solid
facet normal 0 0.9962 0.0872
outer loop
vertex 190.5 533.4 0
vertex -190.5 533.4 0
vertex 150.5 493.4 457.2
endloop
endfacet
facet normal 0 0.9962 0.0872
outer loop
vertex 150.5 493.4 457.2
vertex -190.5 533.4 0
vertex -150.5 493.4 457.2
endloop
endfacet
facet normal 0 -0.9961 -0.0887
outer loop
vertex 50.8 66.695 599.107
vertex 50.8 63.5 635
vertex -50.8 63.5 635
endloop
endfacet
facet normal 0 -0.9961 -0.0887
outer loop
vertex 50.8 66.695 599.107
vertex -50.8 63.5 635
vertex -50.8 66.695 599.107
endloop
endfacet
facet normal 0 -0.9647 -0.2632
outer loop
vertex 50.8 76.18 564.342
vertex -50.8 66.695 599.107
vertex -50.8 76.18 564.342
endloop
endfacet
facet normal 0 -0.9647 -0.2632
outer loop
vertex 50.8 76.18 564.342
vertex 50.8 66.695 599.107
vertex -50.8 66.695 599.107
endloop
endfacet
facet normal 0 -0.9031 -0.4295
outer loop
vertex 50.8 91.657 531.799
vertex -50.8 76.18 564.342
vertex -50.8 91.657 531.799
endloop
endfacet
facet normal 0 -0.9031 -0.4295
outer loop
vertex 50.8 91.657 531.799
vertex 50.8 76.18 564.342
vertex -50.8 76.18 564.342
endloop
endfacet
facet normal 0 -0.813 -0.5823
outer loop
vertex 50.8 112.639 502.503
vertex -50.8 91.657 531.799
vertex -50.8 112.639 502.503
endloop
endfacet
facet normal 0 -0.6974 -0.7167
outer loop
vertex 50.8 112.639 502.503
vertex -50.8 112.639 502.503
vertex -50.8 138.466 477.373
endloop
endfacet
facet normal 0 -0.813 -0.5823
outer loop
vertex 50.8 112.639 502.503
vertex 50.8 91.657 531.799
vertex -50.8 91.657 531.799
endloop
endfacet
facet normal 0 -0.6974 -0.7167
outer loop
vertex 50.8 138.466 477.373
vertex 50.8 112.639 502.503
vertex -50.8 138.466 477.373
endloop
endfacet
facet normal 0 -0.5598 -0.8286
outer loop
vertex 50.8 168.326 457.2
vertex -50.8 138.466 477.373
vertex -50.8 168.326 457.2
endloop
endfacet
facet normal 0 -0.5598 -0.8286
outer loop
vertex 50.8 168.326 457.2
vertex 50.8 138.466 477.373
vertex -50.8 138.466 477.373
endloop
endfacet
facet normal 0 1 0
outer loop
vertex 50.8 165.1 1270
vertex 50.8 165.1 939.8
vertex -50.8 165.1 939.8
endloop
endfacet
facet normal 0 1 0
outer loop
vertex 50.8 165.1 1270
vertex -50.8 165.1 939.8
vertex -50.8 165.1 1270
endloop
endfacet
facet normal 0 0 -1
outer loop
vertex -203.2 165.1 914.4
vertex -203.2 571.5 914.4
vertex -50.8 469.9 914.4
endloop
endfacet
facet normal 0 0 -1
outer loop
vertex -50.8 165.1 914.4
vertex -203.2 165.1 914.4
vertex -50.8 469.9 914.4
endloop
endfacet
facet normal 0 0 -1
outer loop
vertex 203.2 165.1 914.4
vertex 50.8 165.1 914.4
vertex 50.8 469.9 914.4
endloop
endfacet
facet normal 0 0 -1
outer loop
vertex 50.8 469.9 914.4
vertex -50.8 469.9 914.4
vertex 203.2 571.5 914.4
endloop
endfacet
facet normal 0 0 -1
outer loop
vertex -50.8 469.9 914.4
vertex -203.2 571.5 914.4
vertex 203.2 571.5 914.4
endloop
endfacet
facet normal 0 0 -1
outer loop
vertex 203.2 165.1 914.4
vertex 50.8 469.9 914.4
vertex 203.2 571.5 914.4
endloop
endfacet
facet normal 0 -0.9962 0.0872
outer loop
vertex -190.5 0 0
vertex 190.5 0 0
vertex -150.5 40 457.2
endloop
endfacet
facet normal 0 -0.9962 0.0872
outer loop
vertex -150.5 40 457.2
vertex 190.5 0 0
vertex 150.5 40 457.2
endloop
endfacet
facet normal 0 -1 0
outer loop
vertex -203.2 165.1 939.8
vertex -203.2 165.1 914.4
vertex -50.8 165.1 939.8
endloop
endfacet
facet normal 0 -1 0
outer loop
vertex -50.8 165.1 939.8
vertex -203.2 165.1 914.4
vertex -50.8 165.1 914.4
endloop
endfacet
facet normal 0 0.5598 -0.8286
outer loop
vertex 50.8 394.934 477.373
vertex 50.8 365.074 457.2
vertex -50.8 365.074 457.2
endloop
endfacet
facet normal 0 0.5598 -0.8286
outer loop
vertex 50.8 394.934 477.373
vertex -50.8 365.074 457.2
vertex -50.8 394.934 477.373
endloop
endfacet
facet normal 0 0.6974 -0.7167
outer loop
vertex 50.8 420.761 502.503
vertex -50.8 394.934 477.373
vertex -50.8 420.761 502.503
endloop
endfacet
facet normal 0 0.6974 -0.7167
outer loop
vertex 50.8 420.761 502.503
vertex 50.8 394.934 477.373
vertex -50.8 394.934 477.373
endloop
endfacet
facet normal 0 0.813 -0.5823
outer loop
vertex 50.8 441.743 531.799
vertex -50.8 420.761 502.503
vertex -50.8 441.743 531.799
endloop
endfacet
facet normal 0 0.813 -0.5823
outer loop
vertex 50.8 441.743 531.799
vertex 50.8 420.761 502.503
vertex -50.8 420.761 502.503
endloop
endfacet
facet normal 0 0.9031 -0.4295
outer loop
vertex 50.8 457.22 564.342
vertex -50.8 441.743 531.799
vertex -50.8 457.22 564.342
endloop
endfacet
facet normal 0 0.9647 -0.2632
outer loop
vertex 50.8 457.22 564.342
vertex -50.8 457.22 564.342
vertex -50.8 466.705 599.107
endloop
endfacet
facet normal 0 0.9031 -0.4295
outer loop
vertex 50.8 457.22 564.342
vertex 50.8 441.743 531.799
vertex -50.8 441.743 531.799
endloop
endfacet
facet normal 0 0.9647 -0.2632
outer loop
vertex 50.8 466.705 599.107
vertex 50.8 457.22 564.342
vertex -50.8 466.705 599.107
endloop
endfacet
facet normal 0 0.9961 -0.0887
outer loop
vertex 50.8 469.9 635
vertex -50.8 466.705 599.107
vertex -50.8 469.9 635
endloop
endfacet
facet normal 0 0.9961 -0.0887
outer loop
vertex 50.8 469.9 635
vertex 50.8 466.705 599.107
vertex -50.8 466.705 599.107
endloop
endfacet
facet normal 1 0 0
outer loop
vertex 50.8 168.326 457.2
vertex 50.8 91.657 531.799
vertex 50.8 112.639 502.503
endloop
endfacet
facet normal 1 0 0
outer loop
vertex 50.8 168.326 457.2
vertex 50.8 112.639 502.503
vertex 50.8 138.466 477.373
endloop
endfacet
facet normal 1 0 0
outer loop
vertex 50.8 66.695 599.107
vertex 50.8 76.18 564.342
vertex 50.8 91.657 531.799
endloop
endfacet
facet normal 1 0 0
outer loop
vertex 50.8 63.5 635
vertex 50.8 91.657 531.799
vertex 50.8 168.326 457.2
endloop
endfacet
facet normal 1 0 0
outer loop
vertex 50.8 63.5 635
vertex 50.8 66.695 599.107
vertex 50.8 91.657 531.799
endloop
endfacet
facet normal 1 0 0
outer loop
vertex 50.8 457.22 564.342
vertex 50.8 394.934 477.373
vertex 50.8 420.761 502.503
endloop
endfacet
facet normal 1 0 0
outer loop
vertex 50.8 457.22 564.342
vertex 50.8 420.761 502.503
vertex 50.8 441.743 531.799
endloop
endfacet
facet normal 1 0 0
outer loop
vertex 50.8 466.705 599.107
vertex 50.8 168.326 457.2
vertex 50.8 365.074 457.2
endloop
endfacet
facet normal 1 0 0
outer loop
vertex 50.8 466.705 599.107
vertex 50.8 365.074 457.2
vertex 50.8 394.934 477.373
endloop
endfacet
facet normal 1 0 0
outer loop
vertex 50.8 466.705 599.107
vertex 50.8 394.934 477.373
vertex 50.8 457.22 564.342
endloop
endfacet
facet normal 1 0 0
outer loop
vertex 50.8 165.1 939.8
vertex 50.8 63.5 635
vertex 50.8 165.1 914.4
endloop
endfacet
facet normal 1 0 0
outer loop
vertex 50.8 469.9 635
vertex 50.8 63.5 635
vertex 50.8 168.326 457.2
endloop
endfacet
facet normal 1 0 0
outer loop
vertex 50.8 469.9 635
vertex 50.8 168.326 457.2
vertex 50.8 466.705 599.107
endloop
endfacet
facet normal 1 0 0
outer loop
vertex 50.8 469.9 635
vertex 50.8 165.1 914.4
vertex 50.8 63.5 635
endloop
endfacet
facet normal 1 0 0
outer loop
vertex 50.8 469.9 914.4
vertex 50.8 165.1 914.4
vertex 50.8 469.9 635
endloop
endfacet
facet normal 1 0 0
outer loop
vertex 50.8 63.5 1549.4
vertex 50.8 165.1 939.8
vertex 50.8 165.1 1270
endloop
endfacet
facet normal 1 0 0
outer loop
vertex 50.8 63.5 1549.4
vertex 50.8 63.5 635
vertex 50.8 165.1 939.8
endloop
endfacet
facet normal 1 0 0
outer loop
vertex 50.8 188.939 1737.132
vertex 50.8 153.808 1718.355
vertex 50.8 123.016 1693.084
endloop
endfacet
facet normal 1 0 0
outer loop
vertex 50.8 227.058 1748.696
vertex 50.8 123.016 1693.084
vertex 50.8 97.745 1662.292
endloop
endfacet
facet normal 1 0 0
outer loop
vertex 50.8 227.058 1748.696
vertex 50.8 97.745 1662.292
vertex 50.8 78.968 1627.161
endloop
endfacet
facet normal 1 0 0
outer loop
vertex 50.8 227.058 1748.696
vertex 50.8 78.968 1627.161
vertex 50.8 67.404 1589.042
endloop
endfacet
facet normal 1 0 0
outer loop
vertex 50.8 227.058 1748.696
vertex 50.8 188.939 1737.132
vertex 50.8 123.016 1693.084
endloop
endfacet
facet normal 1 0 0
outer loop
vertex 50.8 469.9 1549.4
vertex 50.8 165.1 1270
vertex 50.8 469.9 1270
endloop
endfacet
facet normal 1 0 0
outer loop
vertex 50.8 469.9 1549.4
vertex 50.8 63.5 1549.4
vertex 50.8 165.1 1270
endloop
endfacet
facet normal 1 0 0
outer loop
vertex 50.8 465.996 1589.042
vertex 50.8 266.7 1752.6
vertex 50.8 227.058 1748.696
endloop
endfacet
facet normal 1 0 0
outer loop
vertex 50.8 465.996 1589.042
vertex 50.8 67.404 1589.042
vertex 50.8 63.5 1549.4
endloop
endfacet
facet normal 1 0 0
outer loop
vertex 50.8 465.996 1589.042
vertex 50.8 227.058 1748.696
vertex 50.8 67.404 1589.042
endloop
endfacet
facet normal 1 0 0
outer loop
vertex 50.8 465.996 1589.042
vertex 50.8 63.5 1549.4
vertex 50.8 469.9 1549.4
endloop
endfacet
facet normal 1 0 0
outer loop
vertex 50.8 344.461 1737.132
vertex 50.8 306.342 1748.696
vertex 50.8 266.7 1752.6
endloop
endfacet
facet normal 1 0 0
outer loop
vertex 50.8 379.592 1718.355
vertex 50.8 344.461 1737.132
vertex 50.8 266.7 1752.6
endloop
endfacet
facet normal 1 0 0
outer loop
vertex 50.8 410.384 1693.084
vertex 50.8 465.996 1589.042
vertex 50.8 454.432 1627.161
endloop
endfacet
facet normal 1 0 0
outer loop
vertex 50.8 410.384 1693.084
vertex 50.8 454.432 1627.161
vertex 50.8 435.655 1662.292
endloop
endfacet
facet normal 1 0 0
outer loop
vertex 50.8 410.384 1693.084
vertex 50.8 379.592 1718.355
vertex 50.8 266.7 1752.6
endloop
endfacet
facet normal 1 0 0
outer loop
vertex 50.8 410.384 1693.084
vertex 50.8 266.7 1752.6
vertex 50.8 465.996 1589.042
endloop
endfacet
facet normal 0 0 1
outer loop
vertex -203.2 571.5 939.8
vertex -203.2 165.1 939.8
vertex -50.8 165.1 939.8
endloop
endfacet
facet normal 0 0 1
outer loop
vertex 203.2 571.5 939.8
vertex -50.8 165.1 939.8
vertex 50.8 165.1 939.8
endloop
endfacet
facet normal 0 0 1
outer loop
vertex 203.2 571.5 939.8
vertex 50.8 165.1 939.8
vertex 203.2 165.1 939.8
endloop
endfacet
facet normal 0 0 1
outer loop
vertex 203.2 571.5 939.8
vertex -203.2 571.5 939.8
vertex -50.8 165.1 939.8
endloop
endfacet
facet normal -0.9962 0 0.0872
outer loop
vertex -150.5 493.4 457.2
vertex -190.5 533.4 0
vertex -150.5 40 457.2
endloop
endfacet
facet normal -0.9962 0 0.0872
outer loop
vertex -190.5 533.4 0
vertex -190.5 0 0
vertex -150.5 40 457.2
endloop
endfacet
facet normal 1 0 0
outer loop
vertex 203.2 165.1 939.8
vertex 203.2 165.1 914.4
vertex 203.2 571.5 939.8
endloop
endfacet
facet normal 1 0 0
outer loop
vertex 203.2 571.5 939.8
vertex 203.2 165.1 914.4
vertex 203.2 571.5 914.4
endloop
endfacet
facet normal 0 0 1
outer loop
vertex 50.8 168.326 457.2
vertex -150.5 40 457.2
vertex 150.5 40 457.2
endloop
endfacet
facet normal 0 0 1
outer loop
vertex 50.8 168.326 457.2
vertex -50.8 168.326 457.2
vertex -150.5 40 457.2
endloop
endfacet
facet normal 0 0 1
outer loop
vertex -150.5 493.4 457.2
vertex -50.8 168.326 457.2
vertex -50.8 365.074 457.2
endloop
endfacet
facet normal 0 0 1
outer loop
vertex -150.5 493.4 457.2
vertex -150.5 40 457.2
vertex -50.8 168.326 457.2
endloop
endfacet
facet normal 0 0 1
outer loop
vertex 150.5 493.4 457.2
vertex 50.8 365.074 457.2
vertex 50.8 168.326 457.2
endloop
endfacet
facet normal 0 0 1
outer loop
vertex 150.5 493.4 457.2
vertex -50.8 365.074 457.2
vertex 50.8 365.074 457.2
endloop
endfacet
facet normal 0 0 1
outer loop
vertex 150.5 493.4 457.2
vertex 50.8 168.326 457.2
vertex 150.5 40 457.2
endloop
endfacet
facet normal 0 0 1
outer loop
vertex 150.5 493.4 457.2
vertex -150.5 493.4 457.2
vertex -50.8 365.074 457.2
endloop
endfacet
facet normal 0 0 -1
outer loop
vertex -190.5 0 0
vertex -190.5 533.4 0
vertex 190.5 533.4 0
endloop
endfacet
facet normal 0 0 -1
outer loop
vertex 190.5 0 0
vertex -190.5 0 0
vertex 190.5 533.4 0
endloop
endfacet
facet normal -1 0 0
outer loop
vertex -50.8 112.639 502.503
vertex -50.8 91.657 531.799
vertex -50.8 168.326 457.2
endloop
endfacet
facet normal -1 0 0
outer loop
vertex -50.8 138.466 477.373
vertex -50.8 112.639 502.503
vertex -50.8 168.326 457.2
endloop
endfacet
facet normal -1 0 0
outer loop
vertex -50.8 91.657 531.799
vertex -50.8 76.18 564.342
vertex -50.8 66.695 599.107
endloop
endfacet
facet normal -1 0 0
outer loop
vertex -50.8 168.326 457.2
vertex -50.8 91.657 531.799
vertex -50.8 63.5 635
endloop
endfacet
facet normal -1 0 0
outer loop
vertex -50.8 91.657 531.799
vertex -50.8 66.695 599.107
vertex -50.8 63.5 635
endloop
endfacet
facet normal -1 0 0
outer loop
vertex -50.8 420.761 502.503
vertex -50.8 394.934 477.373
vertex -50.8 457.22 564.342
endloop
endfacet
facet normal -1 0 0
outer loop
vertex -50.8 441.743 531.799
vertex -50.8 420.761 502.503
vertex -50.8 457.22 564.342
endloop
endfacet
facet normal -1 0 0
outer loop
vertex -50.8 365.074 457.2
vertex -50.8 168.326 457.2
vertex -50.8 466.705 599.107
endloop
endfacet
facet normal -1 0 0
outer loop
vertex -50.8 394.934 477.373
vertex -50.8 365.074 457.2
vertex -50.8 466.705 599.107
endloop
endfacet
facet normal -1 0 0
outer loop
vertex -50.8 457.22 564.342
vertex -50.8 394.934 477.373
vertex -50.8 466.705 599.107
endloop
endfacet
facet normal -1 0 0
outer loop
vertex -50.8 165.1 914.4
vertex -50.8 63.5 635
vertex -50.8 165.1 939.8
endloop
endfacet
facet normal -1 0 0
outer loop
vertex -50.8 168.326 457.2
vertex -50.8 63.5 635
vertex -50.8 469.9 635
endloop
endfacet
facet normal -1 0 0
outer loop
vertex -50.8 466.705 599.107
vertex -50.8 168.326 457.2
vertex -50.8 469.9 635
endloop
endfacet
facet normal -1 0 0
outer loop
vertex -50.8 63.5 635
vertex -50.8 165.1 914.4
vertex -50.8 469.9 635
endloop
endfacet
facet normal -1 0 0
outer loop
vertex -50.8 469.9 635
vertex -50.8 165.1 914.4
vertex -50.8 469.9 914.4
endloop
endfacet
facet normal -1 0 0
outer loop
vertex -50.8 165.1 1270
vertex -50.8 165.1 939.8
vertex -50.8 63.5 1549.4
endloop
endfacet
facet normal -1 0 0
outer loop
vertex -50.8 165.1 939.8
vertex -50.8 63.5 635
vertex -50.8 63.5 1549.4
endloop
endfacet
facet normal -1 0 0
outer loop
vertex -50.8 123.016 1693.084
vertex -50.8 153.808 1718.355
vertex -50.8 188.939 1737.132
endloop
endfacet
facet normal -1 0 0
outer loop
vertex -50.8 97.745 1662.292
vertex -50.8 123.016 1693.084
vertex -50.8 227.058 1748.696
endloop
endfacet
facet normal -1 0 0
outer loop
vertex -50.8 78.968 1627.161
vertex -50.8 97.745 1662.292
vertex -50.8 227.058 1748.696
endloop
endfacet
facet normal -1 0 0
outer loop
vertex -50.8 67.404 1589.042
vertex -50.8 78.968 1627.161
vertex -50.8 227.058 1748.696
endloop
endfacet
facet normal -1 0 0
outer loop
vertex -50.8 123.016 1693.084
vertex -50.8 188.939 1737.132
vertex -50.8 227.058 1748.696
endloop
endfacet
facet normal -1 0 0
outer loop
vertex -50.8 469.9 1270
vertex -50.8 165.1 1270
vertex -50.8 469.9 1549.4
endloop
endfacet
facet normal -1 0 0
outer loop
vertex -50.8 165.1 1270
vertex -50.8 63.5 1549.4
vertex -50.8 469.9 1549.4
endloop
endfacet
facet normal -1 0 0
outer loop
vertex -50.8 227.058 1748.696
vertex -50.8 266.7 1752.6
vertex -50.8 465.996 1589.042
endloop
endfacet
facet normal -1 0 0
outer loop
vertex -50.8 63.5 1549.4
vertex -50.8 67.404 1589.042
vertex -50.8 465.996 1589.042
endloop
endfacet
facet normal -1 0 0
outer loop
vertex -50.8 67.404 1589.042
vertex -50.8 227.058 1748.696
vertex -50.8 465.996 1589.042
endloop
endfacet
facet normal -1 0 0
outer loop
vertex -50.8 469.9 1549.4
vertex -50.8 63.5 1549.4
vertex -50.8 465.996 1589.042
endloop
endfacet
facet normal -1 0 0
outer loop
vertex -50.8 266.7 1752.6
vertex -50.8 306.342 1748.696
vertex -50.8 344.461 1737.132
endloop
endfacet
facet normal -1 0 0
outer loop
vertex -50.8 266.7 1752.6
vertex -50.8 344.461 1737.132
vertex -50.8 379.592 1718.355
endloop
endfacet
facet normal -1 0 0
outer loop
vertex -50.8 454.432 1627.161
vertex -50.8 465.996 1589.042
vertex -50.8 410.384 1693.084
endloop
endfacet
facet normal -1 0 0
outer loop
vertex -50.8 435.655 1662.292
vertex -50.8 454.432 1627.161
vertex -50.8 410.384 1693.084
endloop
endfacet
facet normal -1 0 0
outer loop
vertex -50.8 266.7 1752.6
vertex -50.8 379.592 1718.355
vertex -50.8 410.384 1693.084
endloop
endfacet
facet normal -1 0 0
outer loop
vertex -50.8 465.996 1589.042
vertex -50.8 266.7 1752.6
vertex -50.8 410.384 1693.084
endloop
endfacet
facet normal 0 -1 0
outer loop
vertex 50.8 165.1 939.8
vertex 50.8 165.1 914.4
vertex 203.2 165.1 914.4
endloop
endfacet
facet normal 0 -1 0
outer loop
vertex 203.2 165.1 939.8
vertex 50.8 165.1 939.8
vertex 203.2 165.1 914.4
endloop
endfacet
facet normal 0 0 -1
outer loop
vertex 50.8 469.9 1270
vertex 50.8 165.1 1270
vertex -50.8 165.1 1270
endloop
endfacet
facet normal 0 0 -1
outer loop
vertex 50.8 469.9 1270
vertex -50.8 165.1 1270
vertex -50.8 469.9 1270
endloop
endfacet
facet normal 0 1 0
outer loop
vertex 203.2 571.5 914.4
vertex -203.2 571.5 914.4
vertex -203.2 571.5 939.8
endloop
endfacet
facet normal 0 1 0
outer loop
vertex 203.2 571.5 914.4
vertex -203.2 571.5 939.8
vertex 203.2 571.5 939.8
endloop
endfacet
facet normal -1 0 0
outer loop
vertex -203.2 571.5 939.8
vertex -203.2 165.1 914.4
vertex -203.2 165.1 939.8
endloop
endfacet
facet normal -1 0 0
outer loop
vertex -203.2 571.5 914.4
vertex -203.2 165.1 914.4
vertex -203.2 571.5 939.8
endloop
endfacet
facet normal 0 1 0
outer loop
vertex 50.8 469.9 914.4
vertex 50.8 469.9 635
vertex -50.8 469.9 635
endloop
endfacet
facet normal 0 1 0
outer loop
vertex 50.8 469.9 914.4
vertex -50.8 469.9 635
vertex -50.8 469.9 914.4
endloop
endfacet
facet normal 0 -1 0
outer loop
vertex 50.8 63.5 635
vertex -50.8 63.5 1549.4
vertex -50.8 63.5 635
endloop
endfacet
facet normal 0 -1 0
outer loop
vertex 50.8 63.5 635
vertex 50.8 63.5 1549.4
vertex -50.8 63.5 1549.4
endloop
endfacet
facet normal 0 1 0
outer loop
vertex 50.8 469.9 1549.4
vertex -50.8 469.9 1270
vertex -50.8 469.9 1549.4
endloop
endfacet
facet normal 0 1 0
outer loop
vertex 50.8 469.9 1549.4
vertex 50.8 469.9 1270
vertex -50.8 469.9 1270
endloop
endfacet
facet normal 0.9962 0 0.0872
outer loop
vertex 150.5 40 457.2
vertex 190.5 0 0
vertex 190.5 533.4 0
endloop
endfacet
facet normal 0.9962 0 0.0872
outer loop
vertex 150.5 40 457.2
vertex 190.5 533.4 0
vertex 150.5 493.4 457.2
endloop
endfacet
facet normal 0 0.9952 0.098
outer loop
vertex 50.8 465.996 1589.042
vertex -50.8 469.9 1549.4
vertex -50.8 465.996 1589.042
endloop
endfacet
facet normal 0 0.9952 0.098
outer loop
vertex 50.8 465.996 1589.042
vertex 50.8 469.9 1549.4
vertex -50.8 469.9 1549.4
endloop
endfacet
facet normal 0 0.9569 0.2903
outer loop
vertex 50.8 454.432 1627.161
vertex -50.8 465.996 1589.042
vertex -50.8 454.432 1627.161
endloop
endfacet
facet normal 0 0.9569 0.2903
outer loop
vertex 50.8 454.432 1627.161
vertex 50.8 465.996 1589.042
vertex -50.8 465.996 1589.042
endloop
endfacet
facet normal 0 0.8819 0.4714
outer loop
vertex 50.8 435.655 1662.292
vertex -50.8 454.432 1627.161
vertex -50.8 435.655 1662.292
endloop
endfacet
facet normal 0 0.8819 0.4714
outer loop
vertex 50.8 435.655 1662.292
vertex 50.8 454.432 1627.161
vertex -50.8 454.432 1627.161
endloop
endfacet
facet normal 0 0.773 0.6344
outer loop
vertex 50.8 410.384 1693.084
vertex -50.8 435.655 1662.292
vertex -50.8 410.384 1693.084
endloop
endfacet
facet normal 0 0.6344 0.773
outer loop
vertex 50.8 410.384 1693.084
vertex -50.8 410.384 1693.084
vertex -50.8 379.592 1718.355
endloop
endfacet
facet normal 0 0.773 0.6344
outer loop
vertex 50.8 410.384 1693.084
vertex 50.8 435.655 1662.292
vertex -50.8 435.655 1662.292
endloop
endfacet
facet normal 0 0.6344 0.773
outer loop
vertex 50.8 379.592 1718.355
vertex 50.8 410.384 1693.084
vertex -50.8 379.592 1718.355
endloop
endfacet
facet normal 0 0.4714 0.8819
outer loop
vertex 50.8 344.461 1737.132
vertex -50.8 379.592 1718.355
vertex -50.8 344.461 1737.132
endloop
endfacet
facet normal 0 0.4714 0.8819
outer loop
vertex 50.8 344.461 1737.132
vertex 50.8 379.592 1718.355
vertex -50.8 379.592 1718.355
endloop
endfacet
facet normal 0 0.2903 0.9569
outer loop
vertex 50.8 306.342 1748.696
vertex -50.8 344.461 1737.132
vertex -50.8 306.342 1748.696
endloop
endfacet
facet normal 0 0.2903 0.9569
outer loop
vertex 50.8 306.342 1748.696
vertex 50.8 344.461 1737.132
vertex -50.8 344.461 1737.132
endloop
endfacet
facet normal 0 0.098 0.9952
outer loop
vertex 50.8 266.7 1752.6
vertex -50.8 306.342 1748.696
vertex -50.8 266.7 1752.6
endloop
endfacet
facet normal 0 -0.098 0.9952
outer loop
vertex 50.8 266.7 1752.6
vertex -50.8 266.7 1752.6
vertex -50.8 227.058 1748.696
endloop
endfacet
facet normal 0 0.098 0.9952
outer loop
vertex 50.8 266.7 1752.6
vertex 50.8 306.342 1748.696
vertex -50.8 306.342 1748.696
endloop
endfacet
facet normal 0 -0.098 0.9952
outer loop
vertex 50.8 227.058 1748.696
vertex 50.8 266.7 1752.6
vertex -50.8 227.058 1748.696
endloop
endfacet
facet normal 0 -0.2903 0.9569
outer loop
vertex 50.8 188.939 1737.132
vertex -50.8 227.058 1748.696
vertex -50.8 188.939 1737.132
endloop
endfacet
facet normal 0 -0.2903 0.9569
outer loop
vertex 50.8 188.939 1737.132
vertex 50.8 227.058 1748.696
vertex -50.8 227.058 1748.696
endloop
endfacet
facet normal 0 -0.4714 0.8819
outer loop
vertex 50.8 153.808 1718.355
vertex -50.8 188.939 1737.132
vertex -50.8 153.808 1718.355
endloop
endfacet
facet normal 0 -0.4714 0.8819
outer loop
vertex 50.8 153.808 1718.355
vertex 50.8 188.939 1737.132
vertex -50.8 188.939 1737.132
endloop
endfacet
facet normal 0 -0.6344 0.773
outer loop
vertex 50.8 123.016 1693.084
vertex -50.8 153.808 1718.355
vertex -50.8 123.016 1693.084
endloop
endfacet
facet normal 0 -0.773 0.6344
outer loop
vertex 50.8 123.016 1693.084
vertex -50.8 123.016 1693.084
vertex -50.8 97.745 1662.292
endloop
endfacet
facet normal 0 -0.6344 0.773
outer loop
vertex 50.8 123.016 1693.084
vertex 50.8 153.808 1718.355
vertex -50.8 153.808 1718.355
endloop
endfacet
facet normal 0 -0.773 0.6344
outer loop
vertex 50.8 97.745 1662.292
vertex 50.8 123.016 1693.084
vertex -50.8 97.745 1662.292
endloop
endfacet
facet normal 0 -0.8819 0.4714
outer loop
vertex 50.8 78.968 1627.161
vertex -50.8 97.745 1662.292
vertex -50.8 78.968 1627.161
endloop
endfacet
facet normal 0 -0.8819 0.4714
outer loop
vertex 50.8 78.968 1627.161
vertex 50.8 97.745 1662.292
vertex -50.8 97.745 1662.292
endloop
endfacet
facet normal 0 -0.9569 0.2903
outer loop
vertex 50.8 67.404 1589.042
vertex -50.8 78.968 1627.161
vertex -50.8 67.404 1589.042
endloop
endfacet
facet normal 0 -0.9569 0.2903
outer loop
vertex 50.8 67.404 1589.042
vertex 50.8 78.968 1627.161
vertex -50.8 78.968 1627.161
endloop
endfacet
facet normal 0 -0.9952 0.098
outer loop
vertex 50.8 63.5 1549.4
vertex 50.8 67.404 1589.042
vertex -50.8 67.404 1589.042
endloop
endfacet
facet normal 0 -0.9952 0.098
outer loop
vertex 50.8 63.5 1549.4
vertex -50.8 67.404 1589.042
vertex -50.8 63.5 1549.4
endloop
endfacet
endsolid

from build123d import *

# Parameters (mm, degrees)
F0_W     = 381
F0_H     = 533.4
F1_DEPTH = 457.2
F1_TAPER = 5
F3_DEPTH = 50.8
F4_W     = 406.4
F4_H     = 406.4
F5_DEPTH = 25.4


with BuildPart() as f1:
    # F0 (on Top) → F1 (new body)
    with BuildSketch(Plane.XY):
        with Locations((0, 266.7)):
            Rectangle(F0_W, F0_H)
    extrude(amount=F1_DEPTH, taper=F1_TAPER)

    # F2 (on Right) → F3 (join, symmetric)
    with BuildSketch(Plane.YZ):
        with BuildLine():
            Line((63.5, 1549.4), (63.5, 635))
            ThreePointArc((63.5, 635), (266.7, 431.8), (469.9, 635))
            Line((469.9, 635), (469.9, 914.4))
            Line((469.9, 914.4), (165.1, 914.4))
            Line((165.1, 914.4), (165.1, 1270))
            Line((165.1, 1270), (469.9, 1270))
            Line((469.9, 1270), (469.9, 1549.4))
            ThreePointArc((469.9, 1549.4), (266.7, 1752.6), (63.5, 1549.4))
        make_face()
    extrude(amount=F3_DEPTH, both=True)

    # F4 (on face) → F5 (join)
    with BuildSketch(Plane.XY.offset(914.4)):
        with Locations((0, 368.3)):
            Rectangle(F4_W, F4_H)
    extrude(amount=F5_DEPTH)


solid = f1.part
